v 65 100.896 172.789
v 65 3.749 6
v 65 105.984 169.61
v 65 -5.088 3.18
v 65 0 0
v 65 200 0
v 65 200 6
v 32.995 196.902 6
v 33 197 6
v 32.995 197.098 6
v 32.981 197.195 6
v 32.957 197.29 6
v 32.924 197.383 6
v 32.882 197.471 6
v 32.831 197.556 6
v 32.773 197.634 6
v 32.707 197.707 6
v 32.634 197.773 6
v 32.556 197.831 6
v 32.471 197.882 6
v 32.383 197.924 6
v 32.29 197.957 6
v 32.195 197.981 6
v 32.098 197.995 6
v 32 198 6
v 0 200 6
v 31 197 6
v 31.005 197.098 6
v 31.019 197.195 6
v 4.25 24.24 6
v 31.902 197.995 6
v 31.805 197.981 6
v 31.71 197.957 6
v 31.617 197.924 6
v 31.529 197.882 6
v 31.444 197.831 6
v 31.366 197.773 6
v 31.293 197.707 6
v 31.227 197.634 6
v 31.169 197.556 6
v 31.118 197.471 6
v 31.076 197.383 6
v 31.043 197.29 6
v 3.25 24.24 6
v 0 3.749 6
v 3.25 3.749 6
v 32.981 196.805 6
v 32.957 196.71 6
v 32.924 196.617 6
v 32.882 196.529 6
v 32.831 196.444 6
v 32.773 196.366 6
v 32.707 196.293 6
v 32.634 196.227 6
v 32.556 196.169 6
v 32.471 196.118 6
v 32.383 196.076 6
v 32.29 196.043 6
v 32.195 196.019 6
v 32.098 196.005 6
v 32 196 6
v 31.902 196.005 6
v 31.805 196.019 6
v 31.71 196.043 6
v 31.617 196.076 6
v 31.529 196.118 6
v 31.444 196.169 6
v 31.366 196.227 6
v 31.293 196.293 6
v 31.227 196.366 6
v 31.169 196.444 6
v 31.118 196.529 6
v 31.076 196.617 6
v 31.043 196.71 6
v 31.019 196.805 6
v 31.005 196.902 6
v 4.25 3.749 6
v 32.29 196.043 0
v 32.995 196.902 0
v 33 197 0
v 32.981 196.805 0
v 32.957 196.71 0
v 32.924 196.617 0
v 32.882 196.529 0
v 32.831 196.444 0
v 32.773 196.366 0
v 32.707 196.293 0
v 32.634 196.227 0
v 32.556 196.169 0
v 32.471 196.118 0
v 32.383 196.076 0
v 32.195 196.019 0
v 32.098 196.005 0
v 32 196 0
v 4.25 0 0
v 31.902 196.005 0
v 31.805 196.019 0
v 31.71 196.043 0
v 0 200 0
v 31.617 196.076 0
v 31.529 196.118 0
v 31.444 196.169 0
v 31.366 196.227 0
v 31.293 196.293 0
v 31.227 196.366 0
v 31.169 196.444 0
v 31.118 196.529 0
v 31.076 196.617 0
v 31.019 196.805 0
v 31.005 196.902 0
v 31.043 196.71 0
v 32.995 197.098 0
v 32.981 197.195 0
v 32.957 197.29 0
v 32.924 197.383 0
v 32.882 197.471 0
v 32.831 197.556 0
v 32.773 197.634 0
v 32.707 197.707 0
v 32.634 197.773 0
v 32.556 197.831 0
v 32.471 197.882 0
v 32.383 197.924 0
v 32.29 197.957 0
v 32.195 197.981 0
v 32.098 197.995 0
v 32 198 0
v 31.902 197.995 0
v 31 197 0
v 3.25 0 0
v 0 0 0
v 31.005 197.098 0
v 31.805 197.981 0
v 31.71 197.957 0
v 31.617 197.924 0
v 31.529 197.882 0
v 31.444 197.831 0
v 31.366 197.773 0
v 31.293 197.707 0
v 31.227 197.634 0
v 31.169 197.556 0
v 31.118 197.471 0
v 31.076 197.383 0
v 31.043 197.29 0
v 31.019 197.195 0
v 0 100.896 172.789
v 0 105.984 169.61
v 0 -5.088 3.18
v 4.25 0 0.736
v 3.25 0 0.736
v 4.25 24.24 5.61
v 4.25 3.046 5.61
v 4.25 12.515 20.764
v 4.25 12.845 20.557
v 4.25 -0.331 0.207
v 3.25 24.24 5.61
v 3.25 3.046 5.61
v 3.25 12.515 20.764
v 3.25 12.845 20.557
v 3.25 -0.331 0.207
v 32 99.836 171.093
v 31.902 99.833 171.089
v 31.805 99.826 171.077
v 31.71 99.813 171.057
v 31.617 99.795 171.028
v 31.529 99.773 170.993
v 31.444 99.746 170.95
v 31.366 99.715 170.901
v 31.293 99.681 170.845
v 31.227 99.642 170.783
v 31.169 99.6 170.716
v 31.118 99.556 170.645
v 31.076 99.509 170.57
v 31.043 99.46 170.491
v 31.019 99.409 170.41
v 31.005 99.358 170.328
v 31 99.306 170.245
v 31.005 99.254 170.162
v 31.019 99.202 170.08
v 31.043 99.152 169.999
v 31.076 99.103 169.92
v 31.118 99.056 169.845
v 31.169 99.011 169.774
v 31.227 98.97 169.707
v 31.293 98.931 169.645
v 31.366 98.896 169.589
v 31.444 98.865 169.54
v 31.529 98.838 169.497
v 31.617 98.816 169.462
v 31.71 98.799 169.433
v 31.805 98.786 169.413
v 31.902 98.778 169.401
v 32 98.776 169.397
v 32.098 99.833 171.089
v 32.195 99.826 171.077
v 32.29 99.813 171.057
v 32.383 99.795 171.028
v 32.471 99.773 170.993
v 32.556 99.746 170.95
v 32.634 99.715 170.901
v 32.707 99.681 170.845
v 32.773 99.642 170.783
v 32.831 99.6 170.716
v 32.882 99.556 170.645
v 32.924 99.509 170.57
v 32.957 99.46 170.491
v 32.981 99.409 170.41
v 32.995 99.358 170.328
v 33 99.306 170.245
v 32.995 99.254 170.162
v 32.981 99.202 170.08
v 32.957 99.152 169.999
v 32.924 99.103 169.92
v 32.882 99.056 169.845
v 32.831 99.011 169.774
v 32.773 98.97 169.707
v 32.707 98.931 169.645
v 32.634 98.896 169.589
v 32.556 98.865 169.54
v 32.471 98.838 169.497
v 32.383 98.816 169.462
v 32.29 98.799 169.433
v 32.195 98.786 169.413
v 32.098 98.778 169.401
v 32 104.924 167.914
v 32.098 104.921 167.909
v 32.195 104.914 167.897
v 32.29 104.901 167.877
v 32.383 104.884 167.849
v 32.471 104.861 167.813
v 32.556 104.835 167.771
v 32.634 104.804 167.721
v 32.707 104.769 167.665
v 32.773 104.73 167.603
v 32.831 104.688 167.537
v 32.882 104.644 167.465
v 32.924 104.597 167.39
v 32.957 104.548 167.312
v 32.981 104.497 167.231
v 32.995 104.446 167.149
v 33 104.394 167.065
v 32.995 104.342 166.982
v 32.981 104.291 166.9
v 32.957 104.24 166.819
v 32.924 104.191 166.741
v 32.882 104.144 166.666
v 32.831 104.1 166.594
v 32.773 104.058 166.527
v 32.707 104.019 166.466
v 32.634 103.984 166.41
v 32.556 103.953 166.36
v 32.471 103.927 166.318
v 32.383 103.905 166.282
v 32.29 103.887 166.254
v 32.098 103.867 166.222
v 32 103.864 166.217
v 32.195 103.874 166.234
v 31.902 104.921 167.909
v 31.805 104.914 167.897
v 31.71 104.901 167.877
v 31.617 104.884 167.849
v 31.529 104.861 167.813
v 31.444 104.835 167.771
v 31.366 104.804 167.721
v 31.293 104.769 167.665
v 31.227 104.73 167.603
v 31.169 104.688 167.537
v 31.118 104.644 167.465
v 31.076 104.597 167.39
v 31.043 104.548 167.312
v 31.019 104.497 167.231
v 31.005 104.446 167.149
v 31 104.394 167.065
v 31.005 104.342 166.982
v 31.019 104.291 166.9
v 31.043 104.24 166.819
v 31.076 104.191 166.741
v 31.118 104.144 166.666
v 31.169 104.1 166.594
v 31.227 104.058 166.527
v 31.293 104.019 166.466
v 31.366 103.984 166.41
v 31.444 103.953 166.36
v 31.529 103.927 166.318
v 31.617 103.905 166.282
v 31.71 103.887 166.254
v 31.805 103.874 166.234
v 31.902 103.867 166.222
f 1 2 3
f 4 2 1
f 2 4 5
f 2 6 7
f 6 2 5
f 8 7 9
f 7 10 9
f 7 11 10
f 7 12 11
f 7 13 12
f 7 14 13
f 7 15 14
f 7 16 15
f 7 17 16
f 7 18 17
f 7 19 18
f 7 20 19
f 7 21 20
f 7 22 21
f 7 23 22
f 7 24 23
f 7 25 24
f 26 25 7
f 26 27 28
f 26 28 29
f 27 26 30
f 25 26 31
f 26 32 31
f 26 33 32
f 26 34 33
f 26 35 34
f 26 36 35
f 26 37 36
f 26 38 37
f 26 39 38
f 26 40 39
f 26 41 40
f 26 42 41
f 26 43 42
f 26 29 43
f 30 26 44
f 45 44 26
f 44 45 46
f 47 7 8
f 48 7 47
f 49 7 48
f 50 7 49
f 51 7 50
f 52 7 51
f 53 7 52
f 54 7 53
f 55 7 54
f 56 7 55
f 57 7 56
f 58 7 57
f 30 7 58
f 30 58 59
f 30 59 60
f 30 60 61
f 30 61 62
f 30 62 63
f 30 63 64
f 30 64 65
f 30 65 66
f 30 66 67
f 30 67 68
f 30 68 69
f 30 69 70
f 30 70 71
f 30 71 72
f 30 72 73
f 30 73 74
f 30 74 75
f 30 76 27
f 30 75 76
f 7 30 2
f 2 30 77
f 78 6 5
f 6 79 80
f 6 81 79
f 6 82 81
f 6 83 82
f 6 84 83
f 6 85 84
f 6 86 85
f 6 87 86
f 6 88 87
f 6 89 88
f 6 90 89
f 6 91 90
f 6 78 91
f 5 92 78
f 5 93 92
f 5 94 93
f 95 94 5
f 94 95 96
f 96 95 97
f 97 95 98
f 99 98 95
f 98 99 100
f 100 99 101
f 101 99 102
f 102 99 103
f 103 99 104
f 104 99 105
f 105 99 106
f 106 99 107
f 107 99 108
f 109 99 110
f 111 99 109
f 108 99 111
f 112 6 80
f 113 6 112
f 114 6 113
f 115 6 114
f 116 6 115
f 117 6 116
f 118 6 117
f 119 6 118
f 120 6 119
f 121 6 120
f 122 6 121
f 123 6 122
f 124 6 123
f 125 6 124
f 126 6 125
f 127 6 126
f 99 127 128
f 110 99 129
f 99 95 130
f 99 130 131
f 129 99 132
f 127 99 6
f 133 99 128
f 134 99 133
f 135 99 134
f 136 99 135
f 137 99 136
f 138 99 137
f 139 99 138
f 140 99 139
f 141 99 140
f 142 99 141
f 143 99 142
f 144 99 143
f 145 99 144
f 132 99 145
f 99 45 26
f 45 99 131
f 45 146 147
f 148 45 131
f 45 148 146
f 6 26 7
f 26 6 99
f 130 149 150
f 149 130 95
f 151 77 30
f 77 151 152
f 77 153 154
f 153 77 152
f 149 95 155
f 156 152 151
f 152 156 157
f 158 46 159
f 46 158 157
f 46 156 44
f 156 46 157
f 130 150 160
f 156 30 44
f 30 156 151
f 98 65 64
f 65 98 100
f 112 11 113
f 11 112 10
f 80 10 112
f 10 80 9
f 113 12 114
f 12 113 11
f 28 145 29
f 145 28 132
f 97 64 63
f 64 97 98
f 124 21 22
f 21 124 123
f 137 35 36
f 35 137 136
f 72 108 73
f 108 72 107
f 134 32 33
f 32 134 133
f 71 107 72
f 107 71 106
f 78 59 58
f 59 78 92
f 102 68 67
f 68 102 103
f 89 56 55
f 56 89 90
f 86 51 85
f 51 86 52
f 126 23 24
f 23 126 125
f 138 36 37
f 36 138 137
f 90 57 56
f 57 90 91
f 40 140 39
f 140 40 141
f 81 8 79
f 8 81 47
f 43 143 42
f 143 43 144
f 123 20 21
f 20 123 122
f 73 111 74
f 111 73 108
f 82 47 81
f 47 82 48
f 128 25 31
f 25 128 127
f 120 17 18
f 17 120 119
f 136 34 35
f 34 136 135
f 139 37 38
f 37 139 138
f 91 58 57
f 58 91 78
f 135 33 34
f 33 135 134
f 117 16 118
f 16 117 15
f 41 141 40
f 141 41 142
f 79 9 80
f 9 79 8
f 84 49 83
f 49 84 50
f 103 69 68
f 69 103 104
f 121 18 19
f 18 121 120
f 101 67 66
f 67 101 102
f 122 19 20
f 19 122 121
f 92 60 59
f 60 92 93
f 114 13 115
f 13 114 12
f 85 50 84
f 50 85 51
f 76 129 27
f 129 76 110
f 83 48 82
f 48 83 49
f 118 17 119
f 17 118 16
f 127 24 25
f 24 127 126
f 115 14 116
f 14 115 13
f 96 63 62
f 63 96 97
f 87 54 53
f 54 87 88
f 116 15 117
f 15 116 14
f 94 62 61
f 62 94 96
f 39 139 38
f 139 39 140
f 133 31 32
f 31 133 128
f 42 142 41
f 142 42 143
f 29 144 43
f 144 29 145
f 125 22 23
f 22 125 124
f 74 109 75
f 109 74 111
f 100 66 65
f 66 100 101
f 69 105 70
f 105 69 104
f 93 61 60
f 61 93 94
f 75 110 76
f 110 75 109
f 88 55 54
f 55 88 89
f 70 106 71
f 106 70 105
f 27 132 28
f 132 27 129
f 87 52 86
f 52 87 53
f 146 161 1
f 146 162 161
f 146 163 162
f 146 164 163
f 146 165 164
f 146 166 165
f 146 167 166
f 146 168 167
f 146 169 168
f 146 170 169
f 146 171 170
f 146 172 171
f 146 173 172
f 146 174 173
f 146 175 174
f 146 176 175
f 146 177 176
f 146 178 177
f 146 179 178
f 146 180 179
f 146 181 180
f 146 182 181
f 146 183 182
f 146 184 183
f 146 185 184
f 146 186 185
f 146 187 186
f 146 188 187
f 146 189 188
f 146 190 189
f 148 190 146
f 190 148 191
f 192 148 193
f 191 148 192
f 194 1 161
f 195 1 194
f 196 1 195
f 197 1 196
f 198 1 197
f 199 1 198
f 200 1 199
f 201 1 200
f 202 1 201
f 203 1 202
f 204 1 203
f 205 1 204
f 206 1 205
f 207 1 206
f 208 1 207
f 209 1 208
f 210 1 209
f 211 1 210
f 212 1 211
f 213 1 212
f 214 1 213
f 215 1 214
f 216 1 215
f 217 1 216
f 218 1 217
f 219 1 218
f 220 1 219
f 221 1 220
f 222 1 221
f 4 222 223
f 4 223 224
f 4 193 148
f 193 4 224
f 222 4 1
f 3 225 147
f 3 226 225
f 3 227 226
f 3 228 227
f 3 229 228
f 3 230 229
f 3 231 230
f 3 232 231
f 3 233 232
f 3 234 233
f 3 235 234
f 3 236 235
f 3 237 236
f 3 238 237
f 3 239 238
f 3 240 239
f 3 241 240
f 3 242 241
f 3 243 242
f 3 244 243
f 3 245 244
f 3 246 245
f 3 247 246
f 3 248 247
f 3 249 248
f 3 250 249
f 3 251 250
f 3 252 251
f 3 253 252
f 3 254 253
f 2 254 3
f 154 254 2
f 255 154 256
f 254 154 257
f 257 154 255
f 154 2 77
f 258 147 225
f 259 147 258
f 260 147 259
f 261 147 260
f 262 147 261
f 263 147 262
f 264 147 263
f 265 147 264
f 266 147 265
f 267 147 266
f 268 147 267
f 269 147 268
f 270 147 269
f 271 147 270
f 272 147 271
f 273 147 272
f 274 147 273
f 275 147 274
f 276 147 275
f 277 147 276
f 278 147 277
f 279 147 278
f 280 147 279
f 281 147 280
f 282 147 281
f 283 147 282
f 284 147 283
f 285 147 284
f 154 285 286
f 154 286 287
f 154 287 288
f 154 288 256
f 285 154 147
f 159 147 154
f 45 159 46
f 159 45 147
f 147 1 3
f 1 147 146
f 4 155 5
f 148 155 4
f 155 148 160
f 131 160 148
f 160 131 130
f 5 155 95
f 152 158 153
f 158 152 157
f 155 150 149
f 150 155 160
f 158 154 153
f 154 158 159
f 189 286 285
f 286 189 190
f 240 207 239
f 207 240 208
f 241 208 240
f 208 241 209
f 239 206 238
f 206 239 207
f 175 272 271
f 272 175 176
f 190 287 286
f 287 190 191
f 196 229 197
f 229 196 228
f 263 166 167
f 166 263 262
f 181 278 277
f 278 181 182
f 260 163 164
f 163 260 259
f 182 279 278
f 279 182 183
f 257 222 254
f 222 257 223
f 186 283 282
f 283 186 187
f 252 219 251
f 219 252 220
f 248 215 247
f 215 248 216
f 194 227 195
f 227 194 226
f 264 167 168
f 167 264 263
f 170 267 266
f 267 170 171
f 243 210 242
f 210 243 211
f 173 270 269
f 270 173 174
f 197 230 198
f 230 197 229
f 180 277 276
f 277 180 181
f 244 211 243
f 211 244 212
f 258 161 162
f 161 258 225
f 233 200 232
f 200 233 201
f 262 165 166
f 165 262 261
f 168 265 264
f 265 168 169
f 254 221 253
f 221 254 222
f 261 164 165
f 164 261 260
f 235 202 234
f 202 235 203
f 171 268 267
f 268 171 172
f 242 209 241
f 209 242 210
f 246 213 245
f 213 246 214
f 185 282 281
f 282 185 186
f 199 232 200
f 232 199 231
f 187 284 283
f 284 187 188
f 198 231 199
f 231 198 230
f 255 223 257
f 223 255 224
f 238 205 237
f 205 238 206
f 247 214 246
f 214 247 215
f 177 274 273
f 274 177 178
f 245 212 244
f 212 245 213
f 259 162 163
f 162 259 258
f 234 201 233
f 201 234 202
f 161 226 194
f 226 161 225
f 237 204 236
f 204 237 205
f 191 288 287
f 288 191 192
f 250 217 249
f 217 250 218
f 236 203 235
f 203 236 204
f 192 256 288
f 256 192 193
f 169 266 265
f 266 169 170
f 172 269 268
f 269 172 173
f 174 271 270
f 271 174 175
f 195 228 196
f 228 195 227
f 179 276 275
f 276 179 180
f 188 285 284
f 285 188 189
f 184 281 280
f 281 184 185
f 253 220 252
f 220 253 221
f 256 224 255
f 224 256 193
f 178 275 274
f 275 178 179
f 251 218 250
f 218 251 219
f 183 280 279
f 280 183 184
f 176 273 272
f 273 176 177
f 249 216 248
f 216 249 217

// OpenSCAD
$fn=64;

// wall planter
wood_depth = 65;
wood_length = 200;
wood_angle = 58;
wood_thickness = 6;
glass_depth = wood_depth * 0.9;
glass_thickness = 0.8;
glass_height = 50;
slot_x = glass_thickness + 0.2;
slot_y = sin(wood_angle/2) * glass_height;
slot_z = 0.4;
hole_diameter = 2;
hole_offset = 3;


module plank(back_notch = false) {
  difference() {
    // wood plank face
    cube([wood_depth, wood_length, wood_thickness]);

    // notch
    z_offset = back_notch ? -.01 : wood_thickness - slot_z + .01;
    translate([(wood_depth - glass_depth) / 2, 0, z_offset])
    #cube([slot_x, slot_y, slot_z]);

    // hanger hole
    translate([(wood_depth - hole_diameter/2) / 2, wood_length - hole_offset, -.01])
    #cylinder(h=wood_thickness + 0.02, r=hole_diameter/2);
  }
}

union() {
  plank();

  rotate(wood_angle, [1,0,0])
  plank(true);
}
